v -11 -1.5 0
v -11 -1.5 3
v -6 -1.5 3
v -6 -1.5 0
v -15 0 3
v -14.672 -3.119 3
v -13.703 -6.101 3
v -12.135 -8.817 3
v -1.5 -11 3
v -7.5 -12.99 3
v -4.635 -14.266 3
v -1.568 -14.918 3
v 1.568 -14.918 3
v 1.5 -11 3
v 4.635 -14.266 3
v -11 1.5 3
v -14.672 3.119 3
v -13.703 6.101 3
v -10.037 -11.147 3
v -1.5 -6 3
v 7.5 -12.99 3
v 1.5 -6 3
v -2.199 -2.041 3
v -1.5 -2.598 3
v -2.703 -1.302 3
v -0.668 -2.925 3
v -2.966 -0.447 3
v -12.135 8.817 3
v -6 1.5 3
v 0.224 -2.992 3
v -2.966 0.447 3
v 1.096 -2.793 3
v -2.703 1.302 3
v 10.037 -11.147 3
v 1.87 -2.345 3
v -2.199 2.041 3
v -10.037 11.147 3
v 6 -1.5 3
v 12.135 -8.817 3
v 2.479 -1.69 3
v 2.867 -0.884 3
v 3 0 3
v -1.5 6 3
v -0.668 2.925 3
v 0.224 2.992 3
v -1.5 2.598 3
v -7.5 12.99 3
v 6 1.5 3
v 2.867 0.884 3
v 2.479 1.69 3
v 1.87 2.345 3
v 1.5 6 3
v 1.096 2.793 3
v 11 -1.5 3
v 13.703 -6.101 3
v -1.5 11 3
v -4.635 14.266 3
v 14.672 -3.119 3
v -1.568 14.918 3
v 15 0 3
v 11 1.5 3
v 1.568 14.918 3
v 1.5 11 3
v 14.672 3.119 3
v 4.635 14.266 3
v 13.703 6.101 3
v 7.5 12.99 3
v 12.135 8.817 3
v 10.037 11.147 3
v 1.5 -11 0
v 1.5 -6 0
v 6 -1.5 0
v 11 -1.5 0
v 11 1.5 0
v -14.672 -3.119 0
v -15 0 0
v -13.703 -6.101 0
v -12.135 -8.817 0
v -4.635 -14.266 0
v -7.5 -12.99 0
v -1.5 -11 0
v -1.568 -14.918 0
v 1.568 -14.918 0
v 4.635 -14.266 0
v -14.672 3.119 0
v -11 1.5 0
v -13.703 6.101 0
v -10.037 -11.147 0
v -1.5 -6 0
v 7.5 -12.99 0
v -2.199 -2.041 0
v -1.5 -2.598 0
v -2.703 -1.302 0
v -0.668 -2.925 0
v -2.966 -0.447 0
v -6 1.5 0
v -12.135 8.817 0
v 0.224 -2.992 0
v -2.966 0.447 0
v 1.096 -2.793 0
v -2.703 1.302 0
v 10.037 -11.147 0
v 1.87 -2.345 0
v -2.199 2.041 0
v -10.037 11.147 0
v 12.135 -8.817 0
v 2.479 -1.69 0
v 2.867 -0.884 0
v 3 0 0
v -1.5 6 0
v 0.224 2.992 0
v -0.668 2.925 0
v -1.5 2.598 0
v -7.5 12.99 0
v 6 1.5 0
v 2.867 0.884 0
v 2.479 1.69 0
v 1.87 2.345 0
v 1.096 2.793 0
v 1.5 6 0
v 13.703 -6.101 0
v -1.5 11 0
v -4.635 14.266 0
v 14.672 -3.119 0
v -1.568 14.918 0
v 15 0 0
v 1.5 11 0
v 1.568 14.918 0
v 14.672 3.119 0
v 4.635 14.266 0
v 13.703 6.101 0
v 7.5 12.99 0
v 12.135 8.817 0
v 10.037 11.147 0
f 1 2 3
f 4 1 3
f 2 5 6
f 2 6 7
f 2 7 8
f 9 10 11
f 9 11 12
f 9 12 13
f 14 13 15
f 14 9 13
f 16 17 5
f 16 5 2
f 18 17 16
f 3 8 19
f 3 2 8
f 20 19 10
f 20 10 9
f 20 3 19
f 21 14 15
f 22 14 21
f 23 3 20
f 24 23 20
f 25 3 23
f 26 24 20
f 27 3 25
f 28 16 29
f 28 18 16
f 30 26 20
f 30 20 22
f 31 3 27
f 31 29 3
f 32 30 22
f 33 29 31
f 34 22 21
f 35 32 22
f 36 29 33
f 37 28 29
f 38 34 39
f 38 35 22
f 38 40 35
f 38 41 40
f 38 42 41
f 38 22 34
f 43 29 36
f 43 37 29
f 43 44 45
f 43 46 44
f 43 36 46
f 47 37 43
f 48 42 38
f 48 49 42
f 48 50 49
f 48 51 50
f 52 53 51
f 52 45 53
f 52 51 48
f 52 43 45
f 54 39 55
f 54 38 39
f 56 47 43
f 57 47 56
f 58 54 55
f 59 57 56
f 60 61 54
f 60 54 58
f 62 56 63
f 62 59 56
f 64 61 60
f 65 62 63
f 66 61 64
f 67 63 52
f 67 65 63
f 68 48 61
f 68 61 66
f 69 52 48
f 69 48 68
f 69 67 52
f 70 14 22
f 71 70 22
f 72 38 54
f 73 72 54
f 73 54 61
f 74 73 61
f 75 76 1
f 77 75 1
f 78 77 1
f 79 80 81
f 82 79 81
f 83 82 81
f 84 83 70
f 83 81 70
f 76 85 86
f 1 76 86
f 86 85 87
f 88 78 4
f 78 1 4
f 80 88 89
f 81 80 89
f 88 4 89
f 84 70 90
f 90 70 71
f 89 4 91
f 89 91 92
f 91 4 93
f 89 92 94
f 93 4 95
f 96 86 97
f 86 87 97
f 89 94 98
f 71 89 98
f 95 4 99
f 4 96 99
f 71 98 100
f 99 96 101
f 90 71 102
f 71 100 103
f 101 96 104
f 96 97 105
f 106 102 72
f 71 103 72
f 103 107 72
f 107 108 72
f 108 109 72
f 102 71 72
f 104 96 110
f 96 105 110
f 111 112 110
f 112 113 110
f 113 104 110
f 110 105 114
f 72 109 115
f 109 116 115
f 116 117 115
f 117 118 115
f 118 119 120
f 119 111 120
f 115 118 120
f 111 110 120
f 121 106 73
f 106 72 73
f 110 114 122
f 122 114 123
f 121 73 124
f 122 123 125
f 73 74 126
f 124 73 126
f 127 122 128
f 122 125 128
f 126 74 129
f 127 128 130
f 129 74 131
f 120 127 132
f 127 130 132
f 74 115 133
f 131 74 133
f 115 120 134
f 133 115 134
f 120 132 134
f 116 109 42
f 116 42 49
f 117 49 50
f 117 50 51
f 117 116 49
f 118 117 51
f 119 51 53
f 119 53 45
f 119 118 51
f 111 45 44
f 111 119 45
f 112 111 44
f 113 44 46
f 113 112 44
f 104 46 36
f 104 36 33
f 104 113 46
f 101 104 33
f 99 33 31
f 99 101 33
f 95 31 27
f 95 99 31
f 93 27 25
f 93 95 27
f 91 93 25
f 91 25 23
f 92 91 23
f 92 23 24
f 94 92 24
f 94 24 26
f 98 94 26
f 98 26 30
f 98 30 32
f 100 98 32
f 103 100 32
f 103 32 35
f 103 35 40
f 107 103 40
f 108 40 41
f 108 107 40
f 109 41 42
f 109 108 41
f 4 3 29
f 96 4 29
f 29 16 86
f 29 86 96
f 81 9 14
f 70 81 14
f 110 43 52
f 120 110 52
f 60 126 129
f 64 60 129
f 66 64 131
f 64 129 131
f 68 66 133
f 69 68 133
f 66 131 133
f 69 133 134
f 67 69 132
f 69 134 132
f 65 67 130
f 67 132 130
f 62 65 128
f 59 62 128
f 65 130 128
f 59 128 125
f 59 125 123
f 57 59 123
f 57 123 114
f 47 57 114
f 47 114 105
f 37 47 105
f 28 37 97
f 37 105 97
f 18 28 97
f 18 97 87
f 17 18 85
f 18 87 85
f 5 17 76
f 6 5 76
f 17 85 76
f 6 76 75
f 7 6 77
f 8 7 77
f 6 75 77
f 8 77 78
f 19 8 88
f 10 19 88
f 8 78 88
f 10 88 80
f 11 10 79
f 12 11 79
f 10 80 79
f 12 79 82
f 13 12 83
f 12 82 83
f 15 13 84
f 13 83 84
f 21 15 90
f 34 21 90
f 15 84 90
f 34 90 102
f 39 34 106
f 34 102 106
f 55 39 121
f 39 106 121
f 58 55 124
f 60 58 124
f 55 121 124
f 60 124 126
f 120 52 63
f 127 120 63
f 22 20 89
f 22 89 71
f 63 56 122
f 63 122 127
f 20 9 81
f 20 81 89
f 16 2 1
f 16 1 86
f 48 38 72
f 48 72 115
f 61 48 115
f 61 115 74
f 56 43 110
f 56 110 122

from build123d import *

# Parameters (mm, degrees)
SKETCH1_R           = 15
SKETCH1_R_2         = 3
BOSS_EXTRUDE1_DEPTH = 3
SKETCH2_W           = 5
SKETCH2_H           = 3
SKETCH2_W_2         = 3
SKETCH2_H_2         = 5
CUT_EXTRUDE1_DEPTH  = 3


with BuildPart() as part:
    # Sketch1 → Boss-Extrude1 (new body)
    with BuildSketch(Plane.XY):
        Circle(SKETCH1_R)
        Circle(SKETCH1_R_2, mode=Mode.SUBTRACT)
    extrude(amount=BOSS_EXTRUDE1_DEPTH)

    # Sketch2 → Cut-Extrude1 (cut)
    with BuildSketch(Plane.XY.offset(3)):
        with Locations((8.5, 0)):
            Rectangle(SKETCH2_W, SKETCH2_H)
        with Locations((0, 8.5)):
            Rectangle(SKETCH2_W_2, SKETCH2_H_2)
        with Locations((0, -8.5)):
            Rectangle(SKETCH2_W_2, SKETCH2_H_2)
        with Locations((-8.5, 0)):
            Rectangle(SKETCH2_W, SKETCH2_H)
    extrude(amount=-CUT_EXTRUDE1_DEPTH, mode=Mode.SUBTRACT)


solid = part.part
